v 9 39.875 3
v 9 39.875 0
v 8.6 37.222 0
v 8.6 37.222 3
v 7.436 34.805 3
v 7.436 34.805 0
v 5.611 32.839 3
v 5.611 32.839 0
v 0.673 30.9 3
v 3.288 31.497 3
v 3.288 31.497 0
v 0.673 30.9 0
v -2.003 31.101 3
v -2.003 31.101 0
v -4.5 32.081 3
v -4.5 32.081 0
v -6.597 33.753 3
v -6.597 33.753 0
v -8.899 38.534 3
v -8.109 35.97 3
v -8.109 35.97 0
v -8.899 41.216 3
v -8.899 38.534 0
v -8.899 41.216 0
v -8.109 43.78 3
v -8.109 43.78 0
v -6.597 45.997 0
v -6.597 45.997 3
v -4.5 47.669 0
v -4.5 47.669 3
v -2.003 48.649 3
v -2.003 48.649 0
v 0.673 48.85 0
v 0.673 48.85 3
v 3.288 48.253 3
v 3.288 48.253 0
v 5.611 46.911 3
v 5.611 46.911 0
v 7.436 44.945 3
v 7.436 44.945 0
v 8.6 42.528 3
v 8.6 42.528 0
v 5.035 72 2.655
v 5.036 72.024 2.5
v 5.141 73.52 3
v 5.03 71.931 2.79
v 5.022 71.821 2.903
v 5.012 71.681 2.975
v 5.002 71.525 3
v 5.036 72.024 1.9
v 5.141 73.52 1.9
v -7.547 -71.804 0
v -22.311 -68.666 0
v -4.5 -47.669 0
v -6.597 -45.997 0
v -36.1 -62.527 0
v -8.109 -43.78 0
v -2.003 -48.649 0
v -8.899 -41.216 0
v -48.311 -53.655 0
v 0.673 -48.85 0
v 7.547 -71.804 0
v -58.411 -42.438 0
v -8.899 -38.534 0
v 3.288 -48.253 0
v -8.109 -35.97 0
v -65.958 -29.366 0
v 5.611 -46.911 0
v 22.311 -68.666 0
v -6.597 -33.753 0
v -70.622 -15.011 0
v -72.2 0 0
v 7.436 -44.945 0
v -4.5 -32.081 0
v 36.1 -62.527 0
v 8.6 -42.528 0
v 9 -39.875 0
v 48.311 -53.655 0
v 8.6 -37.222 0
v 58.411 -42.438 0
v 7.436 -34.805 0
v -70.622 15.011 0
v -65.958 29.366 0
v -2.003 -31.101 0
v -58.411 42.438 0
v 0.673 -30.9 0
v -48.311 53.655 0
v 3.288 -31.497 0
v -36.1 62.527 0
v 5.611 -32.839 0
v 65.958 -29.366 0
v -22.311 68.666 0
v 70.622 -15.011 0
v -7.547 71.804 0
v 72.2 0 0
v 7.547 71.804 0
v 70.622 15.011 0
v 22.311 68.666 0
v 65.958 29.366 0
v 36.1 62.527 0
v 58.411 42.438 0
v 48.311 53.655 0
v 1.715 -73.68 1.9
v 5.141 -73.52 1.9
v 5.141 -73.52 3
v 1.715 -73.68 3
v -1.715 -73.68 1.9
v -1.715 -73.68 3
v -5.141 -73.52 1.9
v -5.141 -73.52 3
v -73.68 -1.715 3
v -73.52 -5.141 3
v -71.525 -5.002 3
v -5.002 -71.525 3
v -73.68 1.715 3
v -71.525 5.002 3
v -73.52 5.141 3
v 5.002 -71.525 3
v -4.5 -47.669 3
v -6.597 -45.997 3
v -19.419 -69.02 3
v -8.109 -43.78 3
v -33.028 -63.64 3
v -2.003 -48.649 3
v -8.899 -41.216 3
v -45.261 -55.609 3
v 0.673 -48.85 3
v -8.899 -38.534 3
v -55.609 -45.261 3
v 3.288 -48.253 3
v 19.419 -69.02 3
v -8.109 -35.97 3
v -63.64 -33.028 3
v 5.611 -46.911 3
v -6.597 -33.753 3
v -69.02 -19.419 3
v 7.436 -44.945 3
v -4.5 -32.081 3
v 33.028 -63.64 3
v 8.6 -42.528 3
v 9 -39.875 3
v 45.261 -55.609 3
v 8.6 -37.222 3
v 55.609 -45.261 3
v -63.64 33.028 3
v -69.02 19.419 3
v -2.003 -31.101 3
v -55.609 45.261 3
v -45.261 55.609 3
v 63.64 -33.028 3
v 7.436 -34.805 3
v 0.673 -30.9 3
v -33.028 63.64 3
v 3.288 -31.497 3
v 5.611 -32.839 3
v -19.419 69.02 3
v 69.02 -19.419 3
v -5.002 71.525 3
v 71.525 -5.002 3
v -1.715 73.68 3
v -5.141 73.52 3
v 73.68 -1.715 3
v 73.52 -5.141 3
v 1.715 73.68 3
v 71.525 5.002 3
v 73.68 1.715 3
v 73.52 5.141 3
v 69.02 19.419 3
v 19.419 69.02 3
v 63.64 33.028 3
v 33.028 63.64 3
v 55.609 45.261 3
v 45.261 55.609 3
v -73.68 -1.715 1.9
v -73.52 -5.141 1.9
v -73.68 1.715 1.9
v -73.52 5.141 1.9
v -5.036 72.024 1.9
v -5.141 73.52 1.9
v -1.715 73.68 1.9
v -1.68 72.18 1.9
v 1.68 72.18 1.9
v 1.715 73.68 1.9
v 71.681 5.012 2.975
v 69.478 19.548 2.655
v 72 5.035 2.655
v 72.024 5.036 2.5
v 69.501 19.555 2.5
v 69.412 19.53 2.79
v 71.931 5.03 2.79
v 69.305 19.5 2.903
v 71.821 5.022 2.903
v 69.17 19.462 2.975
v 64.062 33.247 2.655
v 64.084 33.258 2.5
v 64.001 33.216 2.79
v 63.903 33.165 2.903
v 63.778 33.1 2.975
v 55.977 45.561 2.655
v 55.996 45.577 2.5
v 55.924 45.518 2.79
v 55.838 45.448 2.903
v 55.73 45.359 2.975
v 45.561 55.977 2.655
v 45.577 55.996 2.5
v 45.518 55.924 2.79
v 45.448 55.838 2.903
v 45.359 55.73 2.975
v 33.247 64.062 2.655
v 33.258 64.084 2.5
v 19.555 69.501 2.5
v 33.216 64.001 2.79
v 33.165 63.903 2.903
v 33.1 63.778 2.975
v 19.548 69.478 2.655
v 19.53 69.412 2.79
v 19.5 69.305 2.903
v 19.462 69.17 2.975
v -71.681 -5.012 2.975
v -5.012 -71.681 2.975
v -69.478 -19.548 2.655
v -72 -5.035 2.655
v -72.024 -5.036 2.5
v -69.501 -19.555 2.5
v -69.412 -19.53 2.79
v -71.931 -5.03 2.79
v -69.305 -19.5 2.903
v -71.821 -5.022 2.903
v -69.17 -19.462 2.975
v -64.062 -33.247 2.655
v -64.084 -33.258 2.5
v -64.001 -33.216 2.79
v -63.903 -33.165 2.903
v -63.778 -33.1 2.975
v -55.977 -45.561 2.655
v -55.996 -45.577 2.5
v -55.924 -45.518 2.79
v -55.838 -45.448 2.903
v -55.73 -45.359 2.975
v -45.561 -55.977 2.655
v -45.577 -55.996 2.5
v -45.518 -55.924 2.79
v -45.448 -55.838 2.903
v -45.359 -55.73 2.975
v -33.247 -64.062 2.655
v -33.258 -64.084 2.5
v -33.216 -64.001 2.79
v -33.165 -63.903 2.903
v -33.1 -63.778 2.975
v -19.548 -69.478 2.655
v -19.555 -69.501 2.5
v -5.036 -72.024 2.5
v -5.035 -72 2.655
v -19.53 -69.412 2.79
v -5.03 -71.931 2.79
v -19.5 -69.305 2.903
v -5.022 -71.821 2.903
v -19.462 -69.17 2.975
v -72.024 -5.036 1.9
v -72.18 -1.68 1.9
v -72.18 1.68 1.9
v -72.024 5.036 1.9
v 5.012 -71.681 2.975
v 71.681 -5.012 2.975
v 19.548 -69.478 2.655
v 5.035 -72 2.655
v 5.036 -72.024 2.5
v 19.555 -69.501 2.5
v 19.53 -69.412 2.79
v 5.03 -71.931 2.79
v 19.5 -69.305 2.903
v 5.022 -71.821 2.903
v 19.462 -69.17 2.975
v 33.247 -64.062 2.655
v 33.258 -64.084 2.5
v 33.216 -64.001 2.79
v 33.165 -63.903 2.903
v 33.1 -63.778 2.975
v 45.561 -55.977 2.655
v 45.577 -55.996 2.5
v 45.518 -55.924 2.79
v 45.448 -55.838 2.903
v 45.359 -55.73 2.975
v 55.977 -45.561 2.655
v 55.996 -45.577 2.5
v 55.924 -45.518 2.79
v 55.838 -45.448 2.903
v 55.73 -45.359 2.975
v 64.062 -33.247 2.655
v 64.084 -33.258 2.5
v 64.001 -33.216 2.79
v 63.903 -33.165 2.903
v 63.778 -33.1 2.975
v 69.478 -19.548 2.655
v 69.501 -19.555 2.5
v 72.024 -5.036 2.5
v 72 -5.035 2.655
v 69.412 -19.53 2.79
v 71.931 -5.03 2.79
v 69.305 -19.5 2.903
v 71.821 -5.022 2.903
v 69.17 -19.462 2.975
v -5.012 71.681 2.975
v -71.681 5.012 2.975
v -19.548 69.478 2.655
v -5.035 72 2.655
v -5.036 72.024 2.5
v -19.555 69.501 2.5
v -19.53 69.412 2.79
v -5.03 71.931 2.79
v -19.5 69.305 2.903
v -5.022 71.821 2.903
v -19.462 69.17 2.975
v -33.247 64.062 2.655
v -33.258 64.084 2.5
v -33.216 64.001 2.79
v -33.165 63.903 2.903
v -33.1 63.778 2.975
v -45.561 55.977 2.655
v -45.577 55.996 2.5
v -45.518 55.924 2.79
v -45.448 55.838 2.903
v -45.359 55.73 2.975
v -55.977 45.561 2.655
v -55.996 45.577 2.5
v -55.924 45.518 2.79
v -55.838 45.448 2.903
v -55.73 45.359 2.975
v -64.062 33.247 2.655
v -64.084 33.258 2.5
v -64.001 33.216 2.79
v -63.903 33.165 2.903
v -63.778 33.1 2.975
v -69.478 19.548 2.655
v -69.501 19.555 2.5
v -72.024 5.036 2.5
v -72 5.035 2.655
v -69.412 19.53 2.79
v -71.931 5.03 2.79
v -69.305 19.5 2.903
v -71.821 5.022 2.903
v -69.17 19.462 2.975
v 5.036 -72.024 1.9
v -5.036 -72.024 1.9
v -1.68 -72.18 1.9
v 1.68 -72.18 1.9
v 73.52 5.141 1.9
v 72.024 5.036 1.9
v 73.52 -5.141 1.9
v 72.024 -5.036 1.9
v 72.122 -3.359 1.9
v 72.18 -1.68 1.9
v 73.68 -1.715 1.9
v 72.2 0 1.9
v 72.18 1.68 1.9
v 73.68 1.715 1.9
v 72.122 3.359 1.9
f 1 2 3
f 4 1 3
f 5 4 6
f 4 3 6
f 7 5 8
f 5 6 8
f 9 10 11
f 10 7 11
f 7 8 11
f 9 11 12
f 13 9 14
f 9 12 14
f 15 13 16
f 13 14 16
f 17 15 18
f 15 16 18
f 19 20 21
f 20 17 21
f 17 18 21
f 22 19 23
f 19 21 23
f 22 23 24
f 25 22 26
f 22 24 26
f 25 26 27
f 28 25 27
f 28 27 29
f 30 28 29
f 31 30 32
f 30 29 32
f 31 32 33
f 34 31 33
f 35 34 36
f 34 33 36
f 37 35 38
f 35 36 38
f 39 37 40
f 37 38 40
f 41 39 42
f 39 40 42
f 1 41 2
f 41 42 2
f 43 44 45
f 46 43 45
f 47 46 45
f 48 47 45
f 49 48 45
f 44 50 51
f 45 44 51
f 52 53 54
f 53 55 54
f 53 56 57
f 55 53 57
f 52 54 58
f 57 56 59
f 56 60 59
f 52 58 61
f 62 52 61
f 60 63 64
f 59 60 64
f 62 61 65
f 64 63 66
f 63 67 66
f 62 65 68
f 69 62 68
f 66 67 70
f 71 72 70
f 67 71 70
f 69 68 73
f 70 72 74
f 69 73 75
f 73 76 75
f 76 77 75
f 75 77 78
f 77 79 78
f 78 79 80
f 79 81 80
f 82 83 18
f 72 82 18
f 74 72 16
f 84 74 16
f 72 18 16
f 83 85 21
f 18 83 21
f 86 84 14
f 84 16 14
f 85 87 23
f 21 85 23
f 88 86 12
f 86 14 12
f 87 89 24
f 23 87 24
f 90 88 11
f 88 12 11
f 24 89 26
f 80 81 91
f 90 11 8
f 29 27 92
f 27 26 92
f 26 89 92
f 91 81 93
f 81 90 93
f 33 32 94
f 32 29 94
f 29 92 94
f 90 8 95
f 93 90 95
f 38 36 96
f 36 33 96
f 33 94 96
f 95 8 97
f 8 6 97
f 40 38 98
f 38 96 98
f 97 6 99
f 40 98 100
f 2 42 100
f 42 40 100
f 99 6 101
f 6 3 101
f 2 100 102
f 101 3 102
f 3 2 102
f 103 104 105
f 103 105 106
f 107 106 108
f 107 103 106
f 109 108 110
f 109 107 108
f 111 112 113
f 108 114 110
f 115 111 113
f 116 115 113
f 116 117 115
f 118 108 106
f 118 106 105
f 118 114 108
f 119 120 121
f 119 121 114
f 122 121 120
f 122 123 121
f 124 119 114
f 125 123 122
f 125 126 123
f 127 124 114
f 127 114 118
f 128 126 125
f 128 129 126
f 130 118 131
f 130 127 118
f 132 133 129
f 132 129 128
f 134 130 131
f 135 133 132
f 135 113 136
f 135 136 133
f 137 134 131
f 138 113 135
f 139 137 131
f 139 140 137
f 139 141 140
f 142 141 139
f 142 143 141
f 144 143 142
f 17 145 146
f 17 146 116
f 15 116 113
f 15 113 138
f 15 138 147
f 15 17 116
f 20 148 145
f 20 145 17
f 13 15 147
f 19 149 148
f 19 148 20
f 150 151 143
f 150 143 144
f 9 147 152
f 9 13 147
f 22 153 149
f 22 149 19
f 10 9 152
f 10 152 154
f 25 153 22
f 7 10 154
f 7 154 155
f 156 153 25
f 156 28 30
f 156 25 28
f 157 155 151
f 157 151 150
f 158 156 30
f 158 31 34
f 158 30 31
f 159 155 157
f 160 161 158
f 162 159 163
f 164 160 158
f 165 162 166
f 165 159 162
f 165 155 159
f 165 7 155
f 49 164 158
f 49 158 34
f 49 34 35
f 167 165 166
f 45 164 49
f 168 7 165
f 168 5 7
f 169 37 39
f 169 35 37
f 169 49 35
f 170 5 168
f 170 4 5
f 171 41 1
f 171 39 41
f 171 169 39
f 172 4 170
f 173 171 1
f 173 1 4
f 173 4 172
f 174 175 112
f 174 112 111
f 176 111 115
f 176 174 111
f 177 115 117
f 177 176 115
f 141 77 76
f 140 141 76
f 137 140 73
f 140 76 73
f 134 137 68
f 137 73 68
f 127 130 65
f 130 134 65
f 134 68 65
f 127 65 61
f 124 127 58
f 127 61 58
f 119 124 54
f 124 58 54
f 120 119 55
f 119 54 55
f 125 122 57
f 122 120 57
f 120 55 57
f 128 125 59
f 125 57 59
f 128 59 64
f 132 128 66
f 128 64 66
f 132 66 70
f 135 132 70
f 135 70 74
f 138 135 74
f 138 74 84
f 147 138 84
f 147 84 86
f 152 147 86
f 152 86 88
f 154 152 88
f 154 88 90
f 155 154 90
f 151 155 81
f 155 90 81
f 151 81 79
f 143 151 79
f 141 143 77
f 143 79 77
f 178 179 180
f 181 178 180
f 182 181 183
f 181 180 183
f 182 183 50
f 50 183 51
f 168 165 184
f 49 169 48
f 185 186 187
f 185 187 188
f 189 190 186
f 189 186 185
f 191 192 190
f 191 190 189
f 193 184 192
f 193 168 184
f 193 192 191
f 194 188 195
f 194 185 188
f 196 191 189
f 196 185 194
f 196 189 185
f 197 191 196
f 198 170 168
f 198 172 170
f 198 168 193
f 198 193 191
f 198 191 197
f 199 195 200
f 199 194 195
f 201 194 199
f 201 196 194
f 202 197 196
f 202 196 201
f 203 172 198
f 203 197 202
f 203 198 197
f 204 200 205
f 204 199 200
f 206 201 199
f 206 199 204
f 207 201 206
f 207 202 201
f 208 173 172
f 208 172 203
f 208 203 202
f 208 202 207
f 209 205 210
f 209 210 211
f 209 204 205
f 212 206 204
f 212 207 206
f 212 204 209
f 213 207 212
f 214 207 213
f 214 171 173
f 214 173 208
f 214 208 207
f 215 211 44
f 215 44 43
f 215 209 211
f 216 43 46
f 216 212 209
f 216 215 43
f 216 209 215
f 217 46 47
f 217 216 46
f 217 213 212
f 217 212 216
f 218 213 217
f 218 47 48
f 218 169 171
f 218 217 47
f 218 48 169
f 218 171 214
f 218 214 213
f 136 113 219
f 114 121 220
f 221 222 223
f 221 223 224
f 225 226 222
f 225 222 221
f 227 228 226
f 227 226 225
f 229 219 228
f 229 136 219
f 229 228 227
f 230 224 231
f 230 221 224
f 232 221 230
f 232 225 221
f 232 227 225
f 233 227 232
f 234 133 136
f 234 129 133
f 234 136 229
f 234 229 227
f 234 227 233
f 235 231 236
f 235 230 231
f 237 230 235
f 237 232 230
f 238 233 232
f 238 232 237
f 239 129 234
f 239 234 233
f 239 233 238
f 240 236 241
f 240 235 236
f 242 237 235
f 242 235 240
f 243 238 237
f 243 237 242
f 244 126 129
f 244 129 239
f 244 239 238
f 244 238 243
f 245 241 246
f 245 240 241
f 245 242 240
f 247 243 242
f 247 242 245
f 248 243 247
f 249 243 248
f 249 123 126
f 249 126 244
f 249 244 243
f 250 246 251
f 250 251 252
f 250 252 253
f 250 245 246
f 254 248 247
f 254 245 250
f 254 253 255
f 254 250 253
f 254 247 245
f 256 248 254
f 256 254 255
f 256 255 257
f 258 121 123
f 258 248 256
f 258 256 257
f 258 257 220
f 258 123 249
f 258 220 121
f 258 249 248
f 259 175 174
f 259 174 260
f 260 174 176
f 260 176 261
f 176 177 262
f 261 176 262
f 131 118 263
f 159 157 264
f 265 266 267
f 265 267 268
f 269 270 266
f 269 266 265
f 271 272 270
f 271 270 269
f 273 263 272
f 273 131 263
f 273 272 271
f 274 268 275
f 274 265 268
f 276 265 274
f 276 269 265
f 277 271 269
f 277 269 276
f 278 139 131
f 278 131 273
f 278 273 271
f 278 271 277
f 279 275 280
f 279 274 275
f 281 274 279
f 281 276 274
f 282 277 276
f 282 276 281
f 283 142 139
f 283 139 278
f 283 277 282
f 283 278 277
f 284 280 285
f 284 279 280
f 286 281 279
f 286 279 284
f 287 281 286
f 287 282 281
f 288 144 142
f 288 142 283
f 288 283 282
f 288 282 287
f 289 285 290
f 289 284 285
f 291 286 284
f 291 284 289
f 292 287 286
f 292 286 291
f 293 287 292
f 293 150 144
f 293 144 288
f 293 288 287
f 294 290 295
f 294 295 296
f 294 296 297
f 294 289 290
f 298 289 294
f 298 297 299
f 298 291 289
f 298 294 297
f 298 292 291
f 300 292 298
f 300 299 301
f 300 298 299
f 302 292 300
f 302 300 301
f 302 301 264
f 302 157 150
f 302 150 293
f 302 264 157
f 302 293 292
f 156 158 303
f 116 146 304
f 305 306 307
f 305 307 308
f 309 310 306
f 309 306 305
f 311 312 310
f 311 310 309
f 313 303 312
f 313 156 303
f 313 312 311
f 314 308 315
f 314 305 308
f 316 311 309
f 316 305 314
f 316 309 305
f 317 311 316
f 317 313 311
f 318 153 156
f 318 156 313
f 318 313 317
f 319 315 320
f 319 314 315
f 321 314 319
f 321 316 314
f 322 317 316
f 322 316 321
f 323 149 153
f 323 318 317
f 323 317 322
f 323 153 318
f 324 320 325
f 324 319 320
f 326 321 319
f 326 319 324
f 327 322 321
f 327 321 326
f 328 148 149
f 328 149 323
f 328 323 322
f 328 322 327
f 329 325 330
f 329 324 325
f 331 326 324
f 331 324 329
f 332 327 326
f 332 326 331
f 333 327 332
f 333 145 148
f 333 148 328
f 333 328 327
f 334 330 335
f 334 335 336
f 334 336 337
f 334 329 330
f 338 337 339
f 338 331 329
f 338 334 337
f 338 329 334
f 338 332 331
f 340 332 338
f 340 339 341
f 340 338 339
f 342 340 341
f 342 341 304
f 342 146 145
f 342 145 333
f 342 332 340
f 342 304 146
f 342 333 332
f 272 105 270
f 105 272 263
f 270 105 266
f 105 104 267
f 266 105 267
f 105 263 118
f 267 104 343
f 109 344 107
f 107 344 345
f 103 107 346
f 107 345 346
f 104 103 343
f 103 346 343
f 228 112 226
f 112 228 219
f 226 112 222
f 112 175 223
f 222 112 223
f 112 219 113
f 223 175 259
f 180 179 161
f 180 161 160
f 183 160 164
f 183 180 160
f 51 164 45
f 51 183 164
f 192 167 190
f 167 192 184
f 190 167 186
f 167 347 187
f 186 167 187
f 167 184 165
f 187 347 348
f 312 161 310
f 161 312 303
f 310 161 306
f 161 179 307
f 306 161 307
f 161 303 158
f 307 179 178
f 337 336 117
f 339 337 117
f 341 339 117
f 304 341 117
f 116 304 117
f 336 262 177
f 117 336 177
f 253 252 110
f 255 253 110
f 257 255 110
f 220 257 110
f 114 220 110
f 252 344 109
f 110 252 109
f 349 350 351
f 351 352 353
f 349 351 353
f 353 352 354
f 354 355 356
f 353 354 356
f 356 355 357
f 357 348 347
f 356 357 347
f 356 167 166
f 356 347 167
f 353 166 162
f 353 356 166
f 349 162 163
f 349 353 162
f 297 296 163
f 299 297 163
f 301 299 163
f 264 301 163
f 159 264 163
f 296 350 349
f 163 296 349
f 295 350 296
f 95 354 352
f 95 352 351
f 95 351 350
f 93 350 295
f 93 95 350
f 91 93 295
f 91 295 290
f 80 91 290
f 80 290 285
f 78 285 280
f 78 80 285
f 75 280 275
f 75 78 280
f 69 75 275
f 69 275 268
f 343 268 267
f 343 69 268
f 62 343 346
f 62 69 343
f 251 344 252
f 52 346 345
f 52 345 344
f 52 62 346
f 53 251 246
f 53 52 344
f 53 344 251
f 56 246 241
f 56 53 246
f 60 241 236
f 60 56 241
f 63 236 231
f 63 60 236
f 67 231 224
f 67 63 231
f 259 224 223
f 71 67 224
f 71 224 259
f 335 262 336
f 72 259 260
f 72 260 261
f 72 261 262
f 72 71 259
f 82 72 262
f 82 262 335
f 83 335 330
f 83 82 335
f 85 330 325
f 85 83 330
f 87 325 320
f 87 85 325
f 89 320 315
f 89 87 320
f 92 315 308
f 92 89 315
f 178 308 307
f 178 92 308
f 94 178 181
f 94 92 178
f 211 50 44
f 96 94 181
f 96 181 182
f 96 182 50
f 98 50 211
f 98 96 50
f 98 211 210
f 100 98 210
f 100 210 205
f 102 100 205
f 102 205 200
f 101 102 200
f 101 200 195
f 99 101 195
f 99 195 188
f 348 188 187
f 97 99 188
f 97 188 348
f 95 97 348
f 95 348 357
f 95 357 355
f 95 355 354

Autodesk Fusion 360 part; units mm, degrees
sketch "Skizze1" plane through (0, 0, 0) normal (0, 0, 1) x (1, 0, 0)
  circle A0 centre (0, 0) radius 80
extrude "Extrusion1" add sketch "Skizze1" along normal blind 10 makes body 1
fillet "Abrundung1" radius 2 1 edges at (-74.5862, -28.9292, 10) on bodies 1
sketch "Skizze2" plane through (0, 0, 0) normal (0, 1, 0) x (1, 0, 0)
  line L0 (45, 0) -> (-5, -86.6025) construction
ref_plane "Arbeitsebene1" through (-5, 0, 86.6025) normal (-0.5, 0, 0.866) x (0, -1, 0)
sketch "Skizze3" plane through (-5, 0, 86.6025) normal (-0.5, 0, 0.866) x (0, -1, 0)
  circle A0 centre (0, 0) radius 23
  circle A1 centre (0, 0) radius 20
extrude "Extrusion5" add sketch "Skizze3" against normal blind 110 separate body contours A0 | A1 makes body 2
combine "Kombinieren1" operation add target body 1 tool bodies 2
extrude "Extrusion6" cut sketch "Skizze3" against normal blind 50 bodies 1
fillet "Abrundung2" radius 4 3 edges at (65.7846, 0, 10) (-74.5862, -28.9292, 8) (-72.7215, 28.206, 10) on bodies 1
sketch "Skizze4" plane through (-5, 0, 86.6025) normal (-0.5, 0, 0.866) x (0, -1, 0)
  circle A0 centre (0, 0) radius 15.75
extrude "Extrusion7" cut sketch "Skizze4" against normal blind 110 bodies 1
sketch "Skizze5" plane through (0, 0, 0) normal (0, 0, 1) x (1, 0, 0)
  circle A0 centre (0, 0) radius 160
extrude "Extrusion8" cut sketch "Skizze5" against normal blind 110 bodies 1
sketch "Skizze6" plane through (0, 0, 0) normal (0, 0, 1) x (1, 0, 0)
  line L0 (45, 0) -> (85, 0)
ref_plane "Arbeitsebene2" through (45, 0, 0) normal (1, 0, 0) x (0, 1, 0)
sketch "Skizze7" plane through (45, 0, 0) normal (1, 0, 0) x (0, 1, 0)
  line L0 (-4, 0) -> (-4, 1.7)
  line L1 (-4, 1.7) -> (-3.2, 3.3)
  line L2 (-3.2, 3.3) -> (-1, 5.5)
  line L3 (-1, 5.5) -> (1, 5.5)
  line L4 (1, 5.5) -> (3.2, 3.3)
  line L5 (3.2, 3.3) -> (4, 1.7)
  line L6 (4, 1.7) -> (4, 0)
  line L7 (4, 0) -> (-4, 0)
sweep "Sweeping1" cut profiles "Skizze7" path "Skizze6" along L0 section 1 bodies 1
sketch "Skizze8" plane through (0, 0, 0) normal (0, 0, 1) x (1, 0, 0)
  circle A0 centre (0, 0) radius 72.5
extrude "Extrusion9" cut sketch "Skizze8" along normal blind 3 bodies 1
sketch "Skizze9" plane through (0, 0, 0) normal (0, 0, 1) x (1, 0, 0)
  line L0 (72.2241, -6.3188) -> (73.7184, -6.4495)
  arc A0 (73.7184, -6.4495) -> (73.7184, 6.4495) centre (0, 0) ccw
  line L1 (73.7184, 6.4495) -> (72.2241, 6.3188)
  arc A1 (72.2241, -6.3188) -> (72.2241, 6.3188) centre (0, 0) ccw
  line L2 (6.3188, 72.2241) -> (6.4495, 73.7184)
  arc A2 (6.4495, 73.7184) -> (-6.4495, 73.7184) centre (0, 0) ccw
  line L3 (-6.4495, 73.7184) -> (-6.3188, 72.2241)
  arc A3 (6.3188, 72.2241) -> (-6.3188, 72.2241) centre (0, 0) ccw
  line L4 (-72.2241, 6.3188) -> (-73.7184, 6.4495)
  arc A4 (-73.7184, 6.4495) -> (-73.7184, -6.4495) centre (0, 0) ccw
  line L5 (-73.7184, -6.4495) -> (-72.2241, -6.3188)
  arc A5 (-72.2241, 6.3188) -> (-72.2241, -6.3188) centre (0, 0) ccw
  line L6 (-6.3188, -72.2241) -> (-6.4495, -73.7184)
  arc A6 (-6.4495, -73.7184) -> (6.4495, -73.7184) centre (0, 0) ccw
  line L7 (6.4495, -73.7184) -> (6.3188, -72.2241)
  arc A7 (-6.3188, -72.2241) -> (6.3188, -72.2241) centre (0, 0) ccw
extrude "Extrusion10" cut sketch "Skizze9" along normal blind 3 bodies 1
sketch "Skizze10" plane through (0, 0, 0) normal (0, 0, 1) x (1, 0, 0)
  line L0 (72.2241, -6.3188) -> (73.7184, -6.4495)
  arc A0 (73.7184, -6.4495) -> (69.5373, 25.3095) centre (0, 0) ccw
  line L1 (69.5373, 25.3095) -> (68.1277, 24.7965)
  arc A1 (72.2241, -6.3188) -> (68.1277, 24.7965) centre (0, 0) ccw
  line L2 (6.3188, 72.2241) -> (6.4495, 73.7184)
  arc A2 (6.4495, 73.7184) -> (-25.3095, 69.5373) centre (0, 0) ccw
  line L3 (-25.3095, 69.5373) -> (-24.7965, 68.1277)
  arc A3 (6.3188, 72.2241) -> (-24.7965, 68.1277) centre (0, 0) ccw
  line L4 (-72.2241, 6.3188) -> (-73.7184, 6.4495)
  arc A4 (-73.7184, 6.4495) -> (-69.5373, -25.3095) centre (0, 0) ccw
  line L5 (-69.5373, -25.3095) -> (-68.1277, -24.7965)
  arc A5 (-72.2241, 6.3188) -> (-68.1277, -24.7965) centre (0, 0) ccw
  line L6 (-6.3188, -72.2241) -> (-6.4495, -73.7184)
  arc A6 (-6.4495, -73.7184) -> (25.3095, -69.5373) centre (0, 0) ccw
  line L7 (25.3095, -69.5373) -> (24.7965, -68.1277)
  arc A7 (-6.3188, -72.2241) -> (24.7965, -68.1277) centre (0, 0) ccw
extrude "Extrusion11" cut sketch "Skizze10" along normal blind 1.25 from surface at 1.75 bodies 1
sketch "Skizze11" plane through (0, 0, 0) normal (0, 0, 1) x (1, 0, 0)
  circle A0 centre (0, 0) radius 72.2
extrude "Extrusion12" add sketch "Skizze11" along normal blind 3 separate body makes body 3
fillet "Abrundung3" radius 0.5 1 edges at (-67.314, -26.1086, 3) on bodies 3
sketch "Skizze12" plane through (0, 0, 0) normal (0, 0, 1) x (1, 0, 0)
  line L0 (71.0266, -4.9667) -> (73.5205, -5.1411)
  arc A0 (73.5205, -5.1411) -> (73.5205, 5.1411) centre (0, 0) ccw
  line L1 (73.5205, 5.1411) -> (71.0266, 4.9667)
  arc A1 (71.0266, -4.9667) -> (71.0266, 4.9667) centre (0, 0) ccw
  line L2 (4.9667, 71.0266) -> (5.1411, 73.5205)
  arc A2 (5.1411, 73.5205) -> (-5.1411, 73.5205) centre (0, 0) ccw
  line L3 (-5.1411, 73.5205) -> (-4.9667, 71.0266)
  arc A3 (4.9667, 71.0266) -> (-4.9667, 71.0266) centre (0, 0) ccw
  line L4 (-71.0266, 4.9667) -> (-73.5205, 5.1411)
  arc A4 (-73.5205, 5.1411) -> (-73.5205, -5.1411) centre (0, 0) ccw
  line L5 (-73.5205, -5.1411) -> (-71.0266, -4.9667)
  arc A5 (-71.0266, 4.9667) -> (-71.0266, -4.9667) centre (0, 0) ccw
  line L6 (-4.9667, -71.0266) -> (-5.1411, -73.5205)
  arc A6 (-5.1411, -73.5205) -> (5.1411, -73.5205) centre (0, 0) ccw
  line L7 (5.1411, -73.5205) -> (4.9667, -71.0266)
  arc A7 (-4.9667, -71.0266) -> (4.9667, -71.0266) centre (0, 0) ccw
extrude "Extrusion13" add sketch "Skizze12" along normal blind 1.1 from surface at 1.9 separate body makes body 4 at (72.7424, 3.9409, 1.9) makes body 5 at (-72.7424, 3.9409, 1.9) makes body 6 at (-3.9409, 72.7424, 1.9) makes body 7 at (0.5522, -72.8469, 1.9)
combine "Kombinieren2" operation add target body 3 tool bodies 4 5 6 7
sketch "Skizze13" plane through (0, 0, 0) normal (0, 0, 1) x (1, 0, 0)
  circle A0 centre (0, 39.875) radius 9
  circle A1 centre (0, -39.875) radius 9
extrude "Extrusion14" cut sketch "Skizze13" along normal blind 3 bodies 3
delete_body "Körper entfernen1" bodies 1
equation "base_plate_diameter = 160 mm"
equation "base_plate_height = 10 mm"
equation "base_plate_rounding = 2 mm"
equation "leg_outer_diameter = 46 mm"
equation "ring_inner_diameter = 40 mm"
equation "ring_extrude_depth = 50 mm"
equation "hole_inner_diameter = 31.5 mm"
equation "leg_length = 100 mm"
equation "leg_angle = 120 deg"
equation "leg_offset = 45 mm"
equation "leg_plate_rounding = 4 mm"
equation "cable_channel_width = 8 mm"
equation "cable_channel_depth = 5.5 mm"
equation "cable_channel_vertical_height = 2.5 mm"
equation "cable_channel_edge_chamfer = 0.8 mm"
equation "cover_plate_diameter = 145 mm"
equation "cover_plate_thickness = 3 mm"
equation "finger_grip_diameter = 18 mm"
equation "finger_grip_depth = 1.5 mm"
equation "clamp_recess_width = 22 mm"
equation "clamp_recess_length = 12 mm"
equation "clamp_recess_depth = 2.5 mm"
equation "strain_relief_screw_diameter = 2.6 mm"
equation "strain_relief_screw_depth = 6 mm"
equation "d25 = base_plate_height"
equation "d28 = base_plate_rounding"
equation "d41 = leg_plate_rounding"
equation "d53 = cover_plate_thickness"
equation "d55 = cover_plate_thickness"
equation "d60 = cover_plate_thickness"
equation "d67 = cover_plate_thickness"
